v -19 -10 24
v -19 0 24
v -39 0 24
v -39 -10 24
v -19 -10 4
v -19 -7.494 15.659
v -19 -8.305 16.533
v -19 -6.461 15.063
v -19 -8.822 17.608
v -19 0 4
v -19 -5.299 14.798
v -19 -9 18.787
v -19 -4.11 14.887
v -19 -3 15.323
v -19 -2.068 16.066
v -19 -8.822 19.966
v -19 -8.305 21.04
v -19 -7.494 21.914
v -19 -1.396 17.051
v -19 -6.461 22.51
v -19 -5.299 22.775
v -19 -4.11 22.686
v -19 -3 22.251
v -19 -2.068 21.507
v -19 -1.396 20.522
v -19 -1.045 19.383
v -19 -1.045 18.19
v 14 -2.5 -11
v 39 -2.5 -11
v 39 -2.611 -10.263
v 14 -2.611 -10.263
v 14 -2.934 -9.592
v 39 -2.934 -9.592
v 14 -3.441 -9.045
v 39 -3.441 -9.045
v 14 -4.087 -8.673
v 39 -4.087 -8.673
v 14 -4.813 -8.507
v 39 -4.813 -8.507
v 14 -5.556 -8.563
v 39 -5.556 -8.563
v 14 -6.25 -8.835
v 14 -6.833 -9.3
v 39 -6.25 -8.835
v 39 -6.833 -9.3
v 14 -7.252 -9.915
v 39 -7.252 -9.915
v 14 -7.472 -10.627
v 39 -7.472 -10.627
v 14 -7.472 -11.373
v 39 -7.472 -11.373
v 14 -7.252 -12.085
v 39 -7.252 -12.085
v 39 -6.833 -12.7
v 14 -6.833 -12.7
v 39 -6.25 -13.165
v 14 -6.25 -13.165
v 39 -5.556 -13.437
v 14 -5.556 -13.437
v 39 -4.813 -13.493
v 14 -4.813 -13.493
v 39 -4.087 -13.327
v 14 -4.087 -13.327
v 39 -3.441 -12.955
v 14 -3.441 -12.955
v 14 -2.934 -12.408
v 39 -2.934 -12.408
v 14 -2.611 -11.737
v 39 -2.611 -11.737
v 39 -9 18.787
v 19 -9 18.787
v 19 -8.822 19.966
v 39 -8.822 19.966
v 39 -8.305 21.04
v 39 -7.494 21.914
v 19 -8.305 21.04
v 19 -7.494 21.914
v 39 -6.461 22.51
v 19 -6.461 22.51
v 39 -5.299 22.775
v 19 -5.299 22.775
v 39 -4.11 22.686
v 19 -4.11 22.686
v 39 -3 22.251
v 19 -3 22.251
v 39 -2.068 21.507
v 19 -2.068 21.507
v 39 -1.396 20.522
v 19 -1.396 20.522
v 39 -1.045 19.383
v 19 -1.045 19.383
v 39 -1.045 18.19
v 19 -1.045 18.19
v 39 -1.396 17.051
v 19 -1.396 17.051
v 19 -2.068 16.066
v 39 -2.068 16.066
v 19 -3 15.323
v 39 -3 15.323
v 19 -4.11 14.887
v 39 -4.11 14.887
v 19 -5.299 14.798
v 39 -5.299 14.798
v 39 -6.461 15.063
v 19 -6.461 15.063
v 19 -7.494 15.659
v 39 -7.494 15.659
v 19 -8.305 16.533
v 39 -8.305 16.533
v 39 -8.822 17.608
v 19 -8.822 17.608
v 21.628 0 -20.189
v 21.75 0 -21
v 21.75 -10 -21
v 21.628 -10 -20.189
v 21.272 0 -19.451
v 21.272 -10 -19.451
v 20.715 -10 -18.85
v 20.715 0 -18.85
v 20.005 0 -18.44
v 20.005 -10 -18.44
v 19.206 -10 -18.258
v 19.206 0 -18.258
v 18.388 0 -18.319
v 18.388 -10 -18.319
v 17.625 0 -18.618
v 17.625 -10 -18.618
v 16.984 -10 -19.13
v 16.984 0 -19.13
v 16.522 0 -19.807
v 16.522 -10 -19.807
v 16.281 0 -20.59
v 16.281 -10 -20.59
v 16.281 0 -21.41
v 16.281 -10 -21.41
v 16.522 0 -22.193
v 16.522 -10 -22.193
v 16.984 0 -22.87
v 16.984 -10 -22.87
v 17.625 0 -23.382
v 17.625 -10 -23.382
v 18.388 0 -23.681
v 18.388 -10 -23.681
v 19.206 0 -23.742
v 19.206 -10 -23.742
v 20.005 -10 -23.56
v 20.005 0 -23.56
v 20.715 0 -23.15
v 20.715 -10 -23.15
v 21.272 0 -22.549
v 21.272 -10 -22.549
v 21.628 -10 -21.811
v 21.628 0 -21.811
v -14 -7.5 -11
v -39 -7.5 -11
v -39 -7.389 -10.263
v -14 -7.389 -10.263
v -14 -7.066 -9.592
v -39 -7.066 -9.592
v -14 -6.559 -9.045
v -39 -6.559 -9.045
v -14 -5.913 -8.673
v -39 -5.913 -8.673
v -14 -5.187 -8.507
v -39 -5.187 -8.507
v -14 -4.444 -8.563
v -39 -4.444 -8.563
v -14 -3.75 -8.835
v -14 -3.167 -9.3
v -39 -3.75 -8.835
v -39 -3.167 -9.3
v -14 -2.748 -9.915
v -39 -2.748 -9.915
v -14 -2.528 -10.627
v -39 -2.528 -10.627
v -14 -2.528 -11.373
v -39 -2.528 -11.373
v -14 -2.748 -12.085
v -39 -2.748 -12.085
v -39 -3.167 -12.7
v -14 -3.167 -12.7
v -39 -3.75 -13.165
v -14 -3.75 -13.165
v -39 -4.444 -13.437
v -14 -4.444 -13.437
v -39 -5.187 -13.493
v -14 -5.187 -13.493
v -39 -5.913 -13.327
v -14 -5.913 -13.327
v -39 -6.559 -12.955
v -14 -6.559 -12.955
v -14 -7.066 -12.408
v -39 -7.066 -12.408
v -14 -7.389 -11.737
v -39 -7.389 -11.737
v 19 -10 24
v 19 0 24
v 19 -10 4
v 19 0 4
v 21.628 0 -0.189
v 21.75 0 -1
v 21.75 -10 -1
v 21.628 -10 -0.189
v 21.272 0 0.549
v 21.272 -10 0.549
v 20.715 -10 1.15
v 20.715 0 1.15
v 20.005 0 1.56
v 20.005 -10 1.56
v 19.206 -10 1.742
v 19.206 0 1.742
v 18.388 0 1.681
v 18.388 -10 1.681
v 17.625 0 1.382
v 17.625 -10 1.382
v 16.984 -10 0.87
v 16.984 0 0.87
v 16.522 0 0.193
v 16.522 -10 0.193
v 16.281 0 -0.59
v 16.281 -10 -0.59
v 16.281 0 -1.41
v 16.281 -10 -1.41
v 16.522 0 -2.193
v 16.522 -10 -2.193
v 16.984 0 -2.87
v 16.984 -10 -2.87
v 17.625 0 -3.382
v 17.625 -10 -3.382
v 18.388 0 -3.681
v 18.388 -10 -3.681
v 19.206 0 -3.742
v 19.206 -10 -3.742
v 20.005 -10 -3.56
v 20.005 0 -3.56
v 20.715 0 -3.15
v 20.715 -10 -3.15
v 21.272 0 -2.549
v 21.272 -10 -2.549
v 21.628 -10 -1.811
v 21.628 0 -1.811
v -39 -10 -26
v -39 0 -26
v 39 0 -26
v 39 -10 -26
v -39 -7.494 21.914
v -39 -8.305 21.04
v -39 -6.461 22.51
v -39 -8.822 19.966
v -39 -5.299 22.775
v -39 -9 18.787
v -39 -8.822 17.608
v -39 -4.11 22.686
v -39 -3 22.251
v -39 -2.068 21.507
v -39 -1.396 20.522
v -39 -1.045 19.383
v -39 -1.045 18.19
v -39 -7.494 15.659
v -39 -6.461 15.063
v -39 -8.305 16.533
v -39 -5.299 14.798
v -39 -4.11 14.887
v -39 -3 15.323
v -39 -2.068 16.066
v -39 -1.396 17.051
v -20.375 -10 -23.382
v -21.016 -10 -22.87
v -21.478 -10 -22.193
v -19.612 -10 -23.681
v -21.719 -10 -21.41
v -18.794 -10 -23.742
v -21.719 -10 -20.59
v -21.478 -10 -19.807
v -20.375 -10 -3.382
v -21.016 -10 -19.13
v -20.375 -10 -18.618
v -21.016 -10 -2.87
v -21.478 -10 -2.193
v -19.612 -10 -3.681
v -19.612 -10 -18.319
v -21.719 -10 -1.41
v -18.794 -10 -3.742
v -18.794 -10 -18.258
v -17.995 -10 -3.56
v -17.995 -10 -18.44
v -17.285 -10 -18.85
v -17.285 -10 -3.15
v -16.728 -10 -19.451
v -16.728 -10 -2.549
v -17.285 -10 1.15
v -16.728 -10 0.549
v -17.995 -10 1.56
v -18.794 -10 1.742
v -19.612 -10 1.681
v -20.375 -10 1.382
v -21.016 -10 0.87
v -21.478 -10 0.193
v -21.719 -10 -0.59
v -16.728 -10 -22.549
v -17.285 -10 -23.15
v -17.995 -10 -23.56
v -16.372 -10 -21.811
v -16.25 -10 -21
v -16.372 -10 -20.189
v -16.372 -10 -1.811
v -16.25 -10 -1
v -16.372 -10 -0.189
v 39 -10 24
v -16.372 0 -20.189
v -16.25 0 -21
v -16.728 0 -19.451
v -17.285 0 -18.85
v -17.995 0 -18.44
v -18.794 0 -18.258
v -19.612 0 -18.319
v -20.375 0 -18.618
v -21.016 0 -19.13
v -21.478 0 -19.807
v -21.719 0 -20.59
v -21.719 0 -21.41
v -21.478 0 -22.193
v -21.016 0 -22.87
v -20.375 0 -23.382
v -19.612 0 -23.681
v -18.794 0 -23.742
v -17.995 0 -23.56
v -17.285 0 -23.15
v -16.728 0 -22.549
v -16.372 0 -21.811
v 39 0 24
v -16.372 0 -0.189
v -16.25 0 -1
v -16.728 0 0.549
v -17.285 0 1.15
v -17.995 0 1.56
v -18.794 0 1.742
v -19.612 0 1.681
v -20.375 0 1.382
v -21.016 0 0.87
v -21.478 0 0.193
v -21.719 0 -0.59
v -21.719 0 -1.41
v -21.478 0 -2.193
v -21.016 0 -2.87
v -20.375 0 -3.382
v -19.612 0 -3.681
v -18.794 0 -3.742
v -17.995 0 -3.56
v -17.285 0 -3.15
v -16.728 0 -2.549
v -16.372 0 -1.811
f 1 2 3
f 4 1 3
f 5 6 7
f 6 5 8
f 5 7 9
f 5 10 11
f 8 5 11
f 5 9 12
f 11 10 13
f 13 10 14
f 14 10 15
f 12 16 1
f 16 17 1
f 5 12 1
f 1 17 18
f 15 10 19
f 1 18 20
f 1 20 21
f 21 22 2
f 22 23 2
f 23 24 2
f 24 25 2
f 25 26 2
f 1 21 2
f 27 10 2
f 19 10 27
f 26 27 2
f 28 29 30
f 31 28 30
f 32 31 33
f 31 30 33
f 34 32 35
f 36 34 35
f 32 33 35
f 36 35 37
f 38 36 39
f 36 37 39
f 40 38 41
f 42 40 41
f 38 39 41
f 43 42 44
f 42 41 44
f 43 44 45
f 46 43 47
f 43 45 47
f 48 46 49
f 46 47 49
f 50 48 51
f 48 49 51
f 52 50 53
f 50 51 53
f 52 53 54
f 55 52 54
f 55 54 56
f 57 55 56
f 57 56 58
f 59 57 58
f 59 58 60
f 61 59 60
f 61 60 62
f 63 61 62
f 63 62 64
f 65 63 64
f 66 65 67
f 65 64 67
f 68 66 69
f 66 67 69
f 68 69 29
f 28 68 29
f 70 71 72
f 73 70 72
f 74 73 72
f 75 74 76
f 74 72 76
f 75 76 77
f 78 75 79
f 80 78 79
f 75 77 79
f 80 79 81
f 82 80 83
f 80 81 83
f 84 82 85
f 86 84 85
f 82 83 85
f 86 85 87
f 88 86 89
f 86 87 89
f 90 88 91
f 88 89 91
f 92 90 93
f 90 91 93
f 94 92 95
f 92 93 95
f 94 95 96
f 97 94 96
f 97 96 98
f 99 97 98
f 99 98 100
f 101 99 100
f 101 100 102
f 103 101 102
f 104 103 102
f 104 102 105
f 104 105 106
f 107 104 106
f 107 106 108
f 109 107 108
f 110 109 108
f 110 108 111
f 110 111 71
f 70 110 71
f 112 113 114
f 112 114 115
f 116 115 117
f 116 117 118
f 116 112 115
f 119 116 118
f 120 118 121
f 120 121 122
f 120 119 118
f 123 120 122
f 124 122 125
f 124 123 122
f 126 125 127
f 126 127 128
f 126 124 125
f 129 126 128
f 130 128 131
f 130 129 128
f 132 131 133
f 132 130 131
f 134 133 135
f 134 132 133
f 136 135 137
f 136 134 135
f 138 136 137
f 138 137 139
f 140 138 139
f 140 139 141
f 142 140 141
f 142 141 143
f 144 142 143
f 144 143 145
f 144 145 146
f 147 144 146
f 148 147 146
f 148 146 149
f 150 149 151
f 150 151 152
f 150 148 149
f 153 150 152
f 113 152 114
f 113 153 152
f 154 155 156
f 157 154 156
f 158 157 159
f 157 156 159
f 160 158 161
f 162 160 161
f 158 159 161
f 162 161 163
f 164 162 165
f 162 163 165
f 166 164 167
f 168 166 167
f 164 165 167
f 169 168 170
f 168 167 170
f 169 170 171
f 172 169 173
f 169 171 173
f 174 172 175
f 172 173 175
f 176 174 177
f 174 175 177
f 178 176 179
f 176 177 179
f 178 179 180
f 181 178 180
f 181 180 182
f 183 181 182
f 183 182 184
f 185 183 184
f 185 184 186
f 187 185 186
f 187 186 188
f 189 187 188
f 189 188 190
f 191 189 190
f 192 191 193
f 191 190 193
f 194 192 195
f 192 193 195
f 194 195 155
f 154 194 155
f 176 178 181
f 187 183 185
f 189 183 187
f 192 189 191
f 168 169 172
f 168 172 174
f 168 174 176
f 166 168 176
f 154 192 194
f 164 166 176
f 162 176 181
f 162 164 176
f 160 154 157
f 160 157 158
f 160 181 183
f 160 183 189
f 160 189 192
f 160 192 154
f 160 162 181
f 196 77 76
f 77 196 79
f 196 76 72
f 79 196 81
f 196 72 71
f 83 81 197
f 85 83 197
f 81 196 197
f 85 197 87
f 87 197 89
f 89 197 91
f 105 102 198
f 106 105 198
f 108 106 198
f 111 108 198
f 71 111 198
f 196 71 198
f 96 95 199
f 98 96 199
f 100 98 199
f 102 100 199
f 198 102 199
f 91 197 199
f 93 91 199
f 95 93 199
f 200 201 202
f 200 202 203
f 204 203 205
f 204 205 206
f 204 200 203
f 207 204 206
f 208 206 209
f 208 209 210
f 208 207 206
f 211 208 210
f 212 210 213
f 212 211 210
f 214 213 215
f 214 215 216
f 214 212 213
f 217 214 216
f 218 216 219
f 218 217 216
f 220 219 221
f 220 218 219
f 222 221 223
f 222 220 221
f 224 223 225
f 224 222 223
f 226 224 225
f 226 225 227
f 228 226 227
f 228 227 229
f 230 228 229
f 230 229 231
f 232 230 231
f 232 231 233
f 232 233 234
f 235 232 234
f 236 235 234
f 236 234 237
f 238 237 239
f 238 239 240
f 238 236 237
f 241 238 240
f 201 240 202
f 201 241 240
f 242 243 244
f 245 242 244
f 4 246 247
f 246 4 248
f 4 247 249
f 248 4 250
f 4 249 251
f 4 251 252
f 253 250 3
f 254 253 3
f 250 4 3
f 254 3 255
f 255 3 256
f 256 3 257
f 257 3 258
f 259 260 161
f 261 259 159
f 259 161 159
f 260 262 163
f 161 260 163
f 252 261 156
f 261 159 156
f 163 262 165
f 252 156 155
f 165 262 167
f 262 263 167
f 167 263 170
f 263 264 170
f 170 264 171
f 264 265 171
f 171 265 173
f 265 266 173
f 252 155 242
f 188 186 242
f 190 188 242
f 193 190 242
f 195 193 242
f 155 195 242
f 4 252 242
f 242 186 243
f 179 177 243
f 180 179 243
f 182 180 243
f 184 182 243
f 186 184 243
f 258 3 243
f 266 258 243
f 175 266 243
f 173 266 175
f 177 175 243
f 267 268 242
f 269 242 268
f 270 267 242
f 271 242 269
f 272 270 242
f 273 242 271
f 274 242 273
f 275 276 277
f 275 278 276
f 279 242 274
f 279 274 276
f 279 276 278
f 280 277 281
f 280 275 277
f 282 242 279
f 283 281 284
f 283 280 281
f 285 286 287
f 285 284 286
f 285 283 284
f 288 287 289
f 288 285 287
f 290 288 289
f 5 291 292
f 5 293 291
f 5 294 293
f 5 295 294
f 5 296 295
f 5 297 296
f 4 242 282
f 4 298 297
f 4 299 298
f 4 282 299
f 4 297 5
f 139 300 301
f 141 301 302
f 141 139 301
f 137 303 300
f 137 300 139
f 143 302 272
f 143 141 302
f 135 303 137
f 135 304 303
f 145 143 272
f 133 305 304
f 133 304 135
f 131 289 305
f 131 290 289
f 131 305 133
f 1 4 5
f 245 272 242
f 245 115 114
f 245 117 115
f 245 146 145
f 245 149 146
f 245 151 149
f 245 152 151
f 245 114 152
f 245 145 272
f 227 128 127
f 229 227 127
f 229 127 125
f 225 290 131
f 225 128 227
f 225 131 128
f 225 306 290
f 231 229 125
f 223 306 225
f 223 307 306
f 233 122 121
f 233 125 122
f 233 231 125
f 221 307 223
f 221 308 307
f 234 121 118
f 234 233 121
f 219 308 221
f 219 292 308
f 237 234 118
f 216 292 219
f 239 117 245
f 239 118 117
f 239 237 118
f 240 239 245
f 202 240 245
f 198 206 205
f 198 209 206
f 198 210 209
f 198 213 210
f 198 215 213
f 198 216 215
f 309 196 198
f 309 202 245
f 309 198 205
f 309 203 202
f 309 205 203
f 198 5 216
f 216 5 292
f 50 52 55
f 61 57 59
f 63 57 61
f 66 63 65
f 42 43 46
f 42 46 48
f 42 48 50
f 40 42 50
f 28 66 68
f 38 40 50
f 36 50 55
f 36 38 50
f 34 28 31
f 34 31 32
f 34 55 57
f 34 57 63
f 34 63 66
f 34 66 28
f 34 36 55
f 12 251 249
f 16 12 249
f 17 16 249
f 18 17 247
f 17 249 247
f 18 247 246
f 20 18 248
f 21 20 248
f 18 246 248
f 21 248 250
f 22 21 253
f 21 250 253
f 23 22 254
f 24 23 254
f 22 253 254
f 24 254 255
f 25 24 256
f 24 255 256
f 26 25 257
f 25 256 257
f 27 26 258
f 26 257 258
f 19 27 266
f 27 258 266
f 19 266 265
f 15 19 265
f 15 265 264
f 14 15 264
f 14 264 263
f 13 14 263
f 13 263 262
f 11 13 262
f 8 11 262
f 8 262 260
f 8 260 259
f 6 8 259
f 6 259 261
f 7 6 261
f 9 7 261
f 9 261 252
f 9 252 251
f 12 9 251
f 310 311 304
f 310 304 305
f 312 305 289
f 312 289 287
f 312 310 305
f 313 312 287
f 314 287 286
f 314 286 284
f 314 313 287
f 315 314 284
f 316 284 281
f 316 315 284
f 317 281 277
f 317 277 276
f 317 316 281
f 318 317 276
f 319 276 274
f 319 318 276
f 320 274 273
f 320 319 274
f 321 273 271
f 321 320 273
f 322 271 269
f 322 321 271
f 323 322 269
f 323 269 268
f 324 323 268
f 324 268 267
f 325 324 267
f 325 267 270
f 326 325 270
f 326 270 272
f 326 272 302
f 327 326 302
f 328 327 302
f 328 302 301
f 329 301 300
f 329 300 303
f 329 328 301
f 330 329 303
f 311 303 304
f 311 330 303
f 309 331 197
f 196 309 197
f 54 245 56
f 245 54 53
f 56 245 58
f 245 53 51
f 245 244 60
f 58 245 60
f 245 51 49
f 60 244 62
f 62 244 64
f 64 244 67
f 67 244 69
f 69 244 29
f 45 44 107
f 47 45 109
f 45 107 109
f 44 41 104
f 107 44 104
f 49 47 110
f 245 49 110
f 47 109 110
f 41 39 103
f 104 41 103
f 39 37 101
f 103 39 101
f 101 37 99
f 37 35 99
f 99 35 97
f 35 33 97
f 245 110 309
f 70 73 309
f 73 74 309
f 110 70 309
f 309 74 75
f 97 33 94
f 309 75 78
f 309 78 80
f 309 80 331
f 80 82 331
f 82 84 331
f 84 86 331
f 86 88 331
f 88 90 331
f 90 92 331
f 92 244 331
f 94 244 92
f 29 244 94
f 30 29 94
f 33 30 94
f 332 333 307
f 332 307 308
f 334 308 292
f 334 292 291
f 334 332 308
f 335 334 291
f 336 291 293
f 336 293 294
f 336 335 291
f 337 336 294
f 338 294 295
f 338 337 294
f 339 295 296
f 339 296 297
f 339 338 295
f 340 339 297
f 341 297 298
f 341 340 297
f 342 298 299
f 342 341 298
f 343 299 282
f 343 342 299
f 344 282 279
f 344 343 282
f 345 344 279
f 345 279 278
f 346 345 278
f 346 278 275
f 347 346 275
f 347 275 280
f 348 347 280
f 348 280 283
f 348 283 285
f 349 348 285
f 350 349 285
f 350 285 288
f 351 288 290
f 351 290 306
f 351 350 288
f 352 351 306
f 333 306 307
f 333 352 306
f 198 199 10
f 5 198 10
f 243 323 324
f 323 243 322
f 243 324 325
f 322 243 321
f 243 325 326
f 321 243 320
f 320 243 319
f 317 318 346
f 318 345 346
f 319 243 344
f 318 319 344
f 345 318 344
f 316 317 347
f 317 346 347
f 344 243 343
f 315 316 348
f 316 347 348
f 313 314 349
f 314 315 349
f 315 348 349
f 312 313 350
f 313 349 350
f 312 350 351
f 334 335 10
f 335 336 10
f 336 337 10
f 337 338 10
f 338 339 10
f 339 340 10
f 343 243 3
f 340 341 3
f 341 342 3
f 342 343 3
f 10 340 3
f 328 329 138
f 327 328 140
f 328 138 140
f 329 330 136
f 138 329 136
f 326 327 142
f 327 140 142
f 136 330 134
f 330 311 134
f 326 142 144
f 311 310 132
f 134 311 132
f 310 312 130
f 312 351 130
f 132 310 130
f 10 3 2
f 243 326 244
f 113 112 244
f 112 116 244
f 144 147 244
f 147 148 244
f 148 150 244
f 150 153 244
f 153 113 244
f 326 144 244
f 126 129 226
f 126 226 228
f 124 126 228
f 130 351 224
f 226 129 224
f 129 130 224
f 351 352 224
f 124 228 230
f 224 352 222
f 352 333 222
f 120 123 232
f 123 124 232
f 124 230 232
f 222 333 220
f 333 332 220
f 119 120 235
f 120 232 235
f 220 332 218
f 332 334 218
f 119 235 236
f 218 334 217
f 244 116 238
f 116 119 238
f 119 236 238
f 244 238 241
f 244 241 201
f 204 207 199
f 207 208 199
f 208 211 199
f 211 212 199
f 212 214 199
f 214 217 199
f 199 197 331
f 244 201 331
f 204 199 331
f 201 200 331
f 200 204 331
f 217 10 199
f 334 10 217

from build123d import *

# Parameters (mm, degrees)
F0_R     = 2.75
F1_DEPTH = 10
F2_R     = 4
F3_DEPTH = 99
F4_R     = 2.5
F5_DEPTH = 25
F6_R     = 2.5
F7_DEPTH = 25


with BuildPart() as f1:
    # F0 (on Front) → F1 (new body)
    with BuildSketch(Plane.XZ):
        Polygon((-19, 24), (-39, 24), (-39, -26), (39, -26), (39, 24), (19, 24), (19, 4), (-19, 4), align=None)
        with Locations((-19, -21)):
            Circle(F0_R, mode=Mode.SUBTRACT)
        with Locations((19, -21)):
            Circle(F0_R, mode=Mode.SUBTRACT)
        with Locations((-19, -1)):
            Circle(F0_R, mode=Mode.SUBTRACT)
        with Locations((19, -1)):
            Circle(F0_R, mode=Mode.SUBTRACT)
    extrude(amount=F1_DEPTH)

    # F2 (on face) → F3 (cut)
    with BuildSketch(Plane(origin=(-39, 0, 0), x_dir=(0, -1, 0), z_dir=(-1, 0, 0))):
        with Locations((5, 18.786615)):
            Circle(F2_R)
    extrude(amount=-F3_DEPTH, mode=Mode.SUBTRACT)

    # F4 (on face) → F5 (cut)
    with BuildSketch(Plane(origin=(-39, 0, 0), x_dir=(0, -1, 0), z_dir=(-1, 0, 0))):
        with Locations((5, -11)):
            Circle(F4_R)
    extrude(amount=-F5_DEPTH, mode=Mode.SUBTRACT)

    # F6 (on face) → F7 (cut)
    with BuildSketch(Plane.YZ.offset(39)):
        with Locations((-5, -11)):
            Circle(F6_R)
    extrude(amount=-F7_DEPTH, mode=Mode.SUBTRACT)


solid = f1.part
